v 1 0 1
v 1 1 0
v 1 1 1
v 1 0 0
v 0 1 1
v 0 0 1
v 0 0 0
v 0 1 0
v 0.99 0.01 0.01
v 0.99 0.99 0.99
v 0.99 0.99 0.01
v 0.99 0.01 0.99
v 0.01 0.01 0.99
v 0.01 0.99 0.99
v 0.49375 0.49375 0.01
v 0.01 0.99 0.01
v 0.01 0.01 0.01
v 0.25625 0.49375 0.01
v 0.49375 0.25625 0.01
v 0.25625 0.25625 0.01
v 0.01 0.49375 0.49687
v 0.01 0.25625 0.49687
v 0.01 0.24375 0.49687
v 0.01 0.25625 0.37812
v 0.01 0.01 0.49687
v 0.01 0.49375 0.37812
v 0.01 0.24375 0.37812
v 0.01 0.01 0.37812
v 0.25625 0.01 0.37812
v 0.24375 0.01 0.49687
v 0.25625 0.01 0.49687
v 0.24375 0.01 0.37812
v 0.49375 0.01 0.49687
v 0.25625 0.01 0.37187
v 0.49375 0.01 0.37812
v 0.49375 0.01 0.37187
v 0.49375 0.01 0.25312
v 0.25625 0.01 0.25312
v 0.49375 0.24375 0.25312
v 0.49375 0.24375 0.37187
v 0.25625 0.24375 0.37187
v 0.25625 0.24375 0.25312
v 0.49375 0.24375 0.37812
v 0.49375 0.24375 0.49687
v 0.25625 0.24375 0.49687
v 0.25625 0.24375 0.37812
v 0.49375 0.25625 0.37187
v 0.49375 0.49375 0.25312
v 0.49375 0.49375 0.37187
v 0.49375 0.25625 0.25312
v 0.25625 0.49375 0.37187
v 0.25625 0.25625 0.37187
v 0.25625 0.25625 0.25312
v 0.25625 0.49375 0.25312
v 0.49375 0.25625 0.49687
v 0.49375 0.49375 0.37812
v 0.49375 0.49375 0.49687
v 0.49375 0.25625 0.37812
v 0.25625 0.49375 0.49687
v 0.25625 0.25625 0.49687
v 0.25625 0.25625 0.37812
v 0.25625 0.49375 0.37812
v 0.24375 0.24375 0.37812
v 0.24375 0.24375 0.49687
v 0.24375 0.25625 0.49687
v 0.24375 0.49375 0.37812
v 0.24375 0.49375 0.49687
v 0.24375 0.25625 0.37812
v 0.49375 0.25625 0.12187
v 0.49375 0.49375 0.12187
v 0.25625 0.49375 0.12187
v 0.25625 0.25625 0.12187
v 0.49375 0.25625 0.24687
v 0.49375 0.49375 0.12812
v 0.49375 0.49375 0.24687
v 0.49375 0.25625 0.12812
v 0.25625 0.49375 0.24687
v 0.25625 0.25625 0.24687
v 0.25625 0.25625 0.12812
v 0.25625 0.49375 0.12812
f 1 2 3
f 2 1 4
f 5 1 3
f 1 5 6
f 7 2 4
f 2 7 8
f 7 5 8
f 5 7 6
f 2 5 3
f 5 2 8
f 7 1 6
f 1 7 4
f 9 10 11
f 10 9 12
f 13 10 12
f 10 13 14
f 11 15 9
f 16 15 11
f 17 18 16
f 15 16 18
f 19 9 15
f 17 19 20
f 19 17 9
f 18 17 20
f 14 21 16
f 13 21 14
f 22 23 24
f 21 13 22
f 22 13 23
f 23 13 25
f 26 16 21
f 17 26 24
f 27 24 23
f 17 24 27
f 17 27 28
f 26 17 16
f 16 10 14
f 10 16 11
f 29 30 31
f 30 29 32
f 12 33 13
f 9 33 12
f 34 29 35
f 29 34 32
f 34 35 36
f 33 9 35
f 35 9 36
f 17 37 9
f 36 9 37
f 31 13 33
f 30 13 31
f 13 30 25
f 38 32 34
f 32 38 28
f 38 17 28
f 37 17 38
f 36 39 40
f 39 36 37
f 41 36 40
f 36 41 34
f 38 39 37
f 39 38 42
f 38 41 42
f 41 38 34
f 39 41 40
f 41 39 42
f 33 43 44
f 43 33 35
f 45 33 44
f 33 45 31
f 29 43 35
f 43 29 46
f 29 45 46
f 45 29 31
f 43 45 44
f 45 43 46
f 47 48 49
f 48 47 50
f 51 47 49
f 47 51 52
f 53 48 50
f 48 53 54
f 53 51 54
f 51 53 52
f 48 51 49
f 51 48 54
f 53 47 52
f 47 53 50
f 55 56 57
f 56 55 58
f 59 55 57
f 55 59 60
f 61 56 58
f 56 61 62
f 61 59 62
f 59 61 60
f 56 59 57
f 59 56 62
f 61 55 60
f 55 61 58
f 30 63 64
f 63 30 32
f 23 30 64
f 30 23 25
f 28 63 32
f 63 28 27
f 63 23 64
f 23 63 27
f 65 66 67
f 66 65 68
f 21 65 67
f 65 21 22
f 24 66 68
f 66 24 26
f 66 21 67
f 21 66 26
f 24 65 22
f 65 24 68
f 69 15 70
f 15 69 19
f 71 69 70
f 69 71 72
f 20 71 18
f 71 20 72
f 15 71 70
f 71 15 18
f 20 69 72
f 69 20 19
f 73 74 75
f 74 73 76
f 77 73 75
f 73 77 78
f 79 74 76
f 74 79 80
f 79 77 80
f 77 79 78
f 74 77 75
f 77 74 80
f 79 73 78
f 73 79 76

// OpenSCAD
translate([0.375, 0.125, 0.3125]) color([0.3723307592388937, 0.2687975496070053, 0.5431010148318319]) cube([0.2375, 0.2375, 0.11875], center=true);
translate([0.375, 0.125, 0.4375]) color([0.3390737213020516, 0.4953995731584907, 0.47426568178825046]) cube([0.2375, 0.2375, 0.11875], center=true);
translate([0.375, 0.375, 0.3125]) color([0.7813281014383978, 0.7049040060844236, 0.6672020242354549]) cube([0.2375, 0.2375, 0.11875], center=true);
translate([0.375, 0.375, 0.4375]) color([0.59891321162433, 0.20675941547323395, 0.4989320496811215]) cube([0.2375, 0.2375, 0.11875], center=true);
translate([0.125, 0.125, 0.4375]) color([0.15860592767823745, 0.24362692220537363, 0.9223470492400727]) cube([0.2375, 0.2375, 0.11875], center=true);
translate([0.125, 0.375, 0.4375]) color([0.08125028632768871, 0.08778967306208207, 0.1566294178982881]) cube([0.2375, 0.2375, 0.11875], center=true);
translate([0.375, 0.375, 0.0625]) color([0.4881466097258217, 0.9394993485091689, 0.09483007936046162]) cube([0.2375, 0.2375, 0.11875], center=true);
translate([0.375, 0.375, 0.1875]) color([0.7496523094784379, 0.698979968590827, 0.8137974970319007]) cube([0.2375, 0.2375, 0.11875], center=true);
color([0.3,0.3,0.3,0.3]) difference() { cube([1,1,1]); translate([0.01,0.01,0.01]) cube([0.98,0.98,0.98]); }
